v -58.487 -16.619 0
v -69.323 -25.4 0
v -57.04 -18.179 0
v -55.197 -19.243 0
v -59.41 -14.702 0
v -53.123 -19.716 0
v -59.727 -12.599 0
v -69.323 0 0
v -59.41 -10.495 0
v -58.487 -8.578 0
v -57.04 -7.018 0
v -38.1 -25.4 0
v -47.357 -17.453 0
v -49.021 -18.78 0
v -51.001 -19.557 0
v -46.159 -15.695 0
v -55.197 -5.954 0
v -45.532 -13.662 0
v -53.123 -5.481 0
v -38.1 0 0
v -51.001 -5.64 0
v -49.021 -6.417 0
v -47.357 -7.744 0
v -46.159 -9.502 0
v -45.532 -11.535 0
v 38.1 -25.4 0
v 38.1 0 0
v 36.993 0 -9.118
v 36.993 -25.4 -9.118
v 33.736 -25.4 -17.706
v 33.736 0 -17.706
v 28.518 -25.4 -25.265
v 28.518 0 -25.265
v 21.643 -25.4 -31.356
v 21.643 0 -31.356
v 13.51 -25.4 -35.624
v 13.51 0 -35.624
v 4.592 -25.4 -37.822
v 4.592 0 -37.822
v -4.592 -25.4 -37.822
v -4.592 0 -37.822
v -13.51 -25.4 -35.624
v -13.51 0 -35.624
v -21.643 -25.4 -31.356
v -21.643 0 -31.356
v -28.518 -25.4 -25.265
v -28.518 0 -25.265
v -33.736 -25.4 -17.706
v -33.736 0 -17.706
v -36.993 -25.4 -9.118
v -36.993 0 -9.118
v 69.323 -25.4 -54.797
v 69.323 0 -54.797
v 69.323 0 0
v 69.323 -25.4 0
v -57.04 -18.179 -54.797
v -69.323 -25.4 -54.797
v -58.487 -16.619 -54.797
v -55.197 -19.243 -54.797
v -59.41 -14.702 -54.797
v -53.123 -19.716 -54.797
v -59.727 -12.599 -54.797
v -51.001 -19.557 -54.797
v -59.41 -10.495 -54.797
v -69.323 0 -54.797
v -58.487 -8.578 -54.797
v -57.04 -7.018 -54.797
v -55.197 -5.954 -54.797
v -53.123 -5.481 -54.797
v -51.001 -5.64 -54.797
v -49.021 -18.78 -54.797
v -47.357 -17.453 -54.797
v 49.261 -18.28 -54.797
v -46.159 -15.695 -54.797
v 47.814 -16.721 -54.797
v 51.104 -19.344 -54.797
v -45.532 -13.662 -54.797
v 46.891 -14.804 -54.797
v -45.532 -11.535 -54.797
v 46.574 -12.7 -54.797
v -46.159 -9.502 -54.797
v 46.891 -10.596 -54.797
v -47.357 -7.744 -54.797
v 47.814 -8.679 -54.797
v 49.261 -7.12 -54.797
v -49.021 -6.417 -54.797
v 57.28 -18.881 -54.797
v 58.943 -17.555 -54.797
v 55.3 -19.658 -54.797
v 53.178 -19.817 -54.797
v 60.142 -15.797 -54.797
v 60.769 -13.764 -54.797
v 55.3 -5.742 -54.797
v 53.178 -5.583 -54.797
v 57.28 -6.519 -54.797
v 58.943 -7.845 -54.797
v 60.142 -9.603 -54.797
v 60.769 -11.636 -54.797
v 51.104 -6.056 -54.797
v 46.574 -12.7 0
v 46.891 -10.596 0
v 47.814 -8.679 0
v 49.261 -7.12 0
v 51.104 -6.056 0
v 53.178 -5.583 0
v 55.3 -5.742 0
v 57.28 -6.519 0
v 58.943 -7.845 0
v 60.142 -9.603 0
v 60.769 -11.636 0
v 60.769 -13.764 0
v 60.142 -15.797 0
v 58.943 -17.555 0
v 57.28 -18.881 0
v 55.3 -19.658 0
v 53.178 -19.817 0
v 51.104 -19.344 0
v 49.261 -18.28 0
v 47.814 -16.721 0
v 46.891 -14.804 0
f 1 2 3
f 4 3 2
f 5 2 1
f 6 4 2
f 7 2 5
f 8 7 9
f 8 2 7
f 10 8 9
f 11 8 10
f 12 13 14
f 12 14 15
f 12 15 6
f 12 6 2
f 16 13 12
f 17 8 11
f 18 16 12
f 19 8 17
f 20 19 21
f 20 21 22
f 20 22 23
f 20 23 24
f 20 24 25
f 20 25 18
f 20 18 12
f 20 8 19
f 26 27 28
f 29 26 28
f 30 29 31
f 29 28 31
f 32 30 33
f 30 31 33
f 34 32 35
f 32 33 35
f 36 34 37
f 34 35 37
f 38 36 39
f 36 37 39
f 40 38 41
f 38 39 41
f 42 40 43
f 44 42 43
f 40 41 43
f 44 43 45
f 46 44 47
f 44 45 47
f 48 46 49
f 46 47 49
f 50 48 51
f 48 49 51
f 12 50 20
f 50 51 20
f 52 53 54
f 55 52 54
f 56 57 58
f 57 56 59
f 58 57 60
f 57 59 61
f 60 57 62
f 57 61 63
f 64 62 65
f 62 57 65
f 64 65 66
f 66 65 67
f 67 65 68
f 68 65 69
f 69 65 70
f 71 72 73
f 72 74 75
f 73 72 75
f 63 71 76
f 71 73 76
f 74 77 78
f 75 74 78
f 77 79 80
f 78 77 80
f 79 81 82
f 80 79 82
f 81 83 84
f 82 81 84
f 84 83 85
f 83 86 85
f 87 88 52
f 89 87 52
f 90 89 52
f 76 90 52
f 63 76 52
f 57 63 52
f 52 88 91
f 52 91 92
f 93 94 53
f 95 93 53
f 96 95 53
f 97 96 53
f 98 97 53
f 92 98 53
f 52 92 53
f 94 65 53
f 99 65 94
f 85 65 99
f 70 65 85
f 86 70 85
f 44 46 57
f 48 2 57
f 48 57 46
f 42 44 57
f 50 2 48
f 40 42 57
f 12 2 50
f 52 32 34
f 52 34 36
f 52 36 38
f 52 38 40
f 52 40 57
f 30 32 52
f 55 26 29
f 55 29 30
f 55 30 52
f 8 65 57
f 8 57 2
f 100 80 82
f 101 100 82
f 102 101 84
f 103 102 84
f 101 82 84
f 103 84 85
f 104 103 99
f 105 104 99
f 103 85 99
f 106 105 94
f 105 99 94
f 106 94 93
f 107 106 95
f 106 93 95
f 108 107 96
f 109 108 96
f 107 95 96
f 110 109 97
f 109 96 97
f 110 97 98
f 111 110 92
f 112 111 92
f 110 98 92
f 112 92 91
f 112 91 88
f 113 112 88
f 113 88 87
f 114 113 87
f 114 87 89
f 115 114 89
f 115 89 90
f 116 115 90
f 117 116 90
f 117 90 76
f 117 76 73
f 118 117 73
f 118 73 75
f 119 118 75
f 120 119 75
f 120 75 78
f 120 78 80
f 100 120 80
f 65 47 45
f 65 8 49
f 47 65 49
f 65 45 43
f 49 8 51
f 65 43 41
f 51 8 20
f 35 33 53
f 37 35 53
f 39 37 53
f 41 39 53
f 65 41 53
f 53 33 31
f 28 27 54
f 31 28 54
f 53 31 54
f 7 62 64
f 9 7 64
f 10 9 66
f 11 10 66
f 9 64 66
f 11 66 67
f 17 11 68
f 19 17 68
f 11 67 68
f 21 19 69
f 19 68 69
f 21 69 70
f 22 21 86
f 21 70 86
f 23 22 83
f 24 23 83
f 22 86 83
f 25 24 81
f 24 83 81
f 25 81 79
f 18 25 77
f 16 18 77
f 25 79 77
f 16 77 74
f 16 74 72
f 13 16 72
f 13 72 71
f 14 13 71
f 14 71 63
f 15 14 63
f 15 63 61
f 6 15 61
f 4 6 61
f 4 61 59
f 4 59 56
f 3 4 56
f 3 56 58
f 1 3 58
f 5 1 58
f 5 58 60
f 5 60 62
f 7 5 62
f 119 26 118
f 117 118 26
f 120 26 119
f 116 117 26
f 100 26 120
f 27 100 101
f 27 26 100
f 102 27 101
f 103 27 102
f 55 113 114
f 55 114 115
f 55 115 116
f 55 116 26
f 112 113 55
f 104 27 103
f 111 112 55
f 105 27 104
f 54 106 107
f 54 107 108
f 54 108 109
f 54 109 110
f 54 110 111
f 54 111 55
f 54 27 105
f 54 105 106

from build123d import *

# Parameters (mm, degrees)
F0_W     = 138.64535
F0_H     = 54.796886
F1_DEPTH = 25.4
F3_D     = 76.2
F5_D     = 14.2748


with BuildPart() as f1:
    # F0 (on Front) → F1 (new body)
    with BuildSketch(Plane.XZ):
        with Locations((0, -27.398443)):
            Rectangle(F0_W, F0_H)
    extrude(amount=F1_DEPTH)

    # F3 (through all)
    with Locations(Plane.XZ.offset(25.4)):
        with Locations((0, 0)):
            Hole(F3_D / 2)

    # F5 (through all)
    with Locations(Plane.XY):
        with Locations((53.711338, -12.7), (-52.589513, -12.598515)):
            Hole(F5_D / 2)


solid = f1.part
